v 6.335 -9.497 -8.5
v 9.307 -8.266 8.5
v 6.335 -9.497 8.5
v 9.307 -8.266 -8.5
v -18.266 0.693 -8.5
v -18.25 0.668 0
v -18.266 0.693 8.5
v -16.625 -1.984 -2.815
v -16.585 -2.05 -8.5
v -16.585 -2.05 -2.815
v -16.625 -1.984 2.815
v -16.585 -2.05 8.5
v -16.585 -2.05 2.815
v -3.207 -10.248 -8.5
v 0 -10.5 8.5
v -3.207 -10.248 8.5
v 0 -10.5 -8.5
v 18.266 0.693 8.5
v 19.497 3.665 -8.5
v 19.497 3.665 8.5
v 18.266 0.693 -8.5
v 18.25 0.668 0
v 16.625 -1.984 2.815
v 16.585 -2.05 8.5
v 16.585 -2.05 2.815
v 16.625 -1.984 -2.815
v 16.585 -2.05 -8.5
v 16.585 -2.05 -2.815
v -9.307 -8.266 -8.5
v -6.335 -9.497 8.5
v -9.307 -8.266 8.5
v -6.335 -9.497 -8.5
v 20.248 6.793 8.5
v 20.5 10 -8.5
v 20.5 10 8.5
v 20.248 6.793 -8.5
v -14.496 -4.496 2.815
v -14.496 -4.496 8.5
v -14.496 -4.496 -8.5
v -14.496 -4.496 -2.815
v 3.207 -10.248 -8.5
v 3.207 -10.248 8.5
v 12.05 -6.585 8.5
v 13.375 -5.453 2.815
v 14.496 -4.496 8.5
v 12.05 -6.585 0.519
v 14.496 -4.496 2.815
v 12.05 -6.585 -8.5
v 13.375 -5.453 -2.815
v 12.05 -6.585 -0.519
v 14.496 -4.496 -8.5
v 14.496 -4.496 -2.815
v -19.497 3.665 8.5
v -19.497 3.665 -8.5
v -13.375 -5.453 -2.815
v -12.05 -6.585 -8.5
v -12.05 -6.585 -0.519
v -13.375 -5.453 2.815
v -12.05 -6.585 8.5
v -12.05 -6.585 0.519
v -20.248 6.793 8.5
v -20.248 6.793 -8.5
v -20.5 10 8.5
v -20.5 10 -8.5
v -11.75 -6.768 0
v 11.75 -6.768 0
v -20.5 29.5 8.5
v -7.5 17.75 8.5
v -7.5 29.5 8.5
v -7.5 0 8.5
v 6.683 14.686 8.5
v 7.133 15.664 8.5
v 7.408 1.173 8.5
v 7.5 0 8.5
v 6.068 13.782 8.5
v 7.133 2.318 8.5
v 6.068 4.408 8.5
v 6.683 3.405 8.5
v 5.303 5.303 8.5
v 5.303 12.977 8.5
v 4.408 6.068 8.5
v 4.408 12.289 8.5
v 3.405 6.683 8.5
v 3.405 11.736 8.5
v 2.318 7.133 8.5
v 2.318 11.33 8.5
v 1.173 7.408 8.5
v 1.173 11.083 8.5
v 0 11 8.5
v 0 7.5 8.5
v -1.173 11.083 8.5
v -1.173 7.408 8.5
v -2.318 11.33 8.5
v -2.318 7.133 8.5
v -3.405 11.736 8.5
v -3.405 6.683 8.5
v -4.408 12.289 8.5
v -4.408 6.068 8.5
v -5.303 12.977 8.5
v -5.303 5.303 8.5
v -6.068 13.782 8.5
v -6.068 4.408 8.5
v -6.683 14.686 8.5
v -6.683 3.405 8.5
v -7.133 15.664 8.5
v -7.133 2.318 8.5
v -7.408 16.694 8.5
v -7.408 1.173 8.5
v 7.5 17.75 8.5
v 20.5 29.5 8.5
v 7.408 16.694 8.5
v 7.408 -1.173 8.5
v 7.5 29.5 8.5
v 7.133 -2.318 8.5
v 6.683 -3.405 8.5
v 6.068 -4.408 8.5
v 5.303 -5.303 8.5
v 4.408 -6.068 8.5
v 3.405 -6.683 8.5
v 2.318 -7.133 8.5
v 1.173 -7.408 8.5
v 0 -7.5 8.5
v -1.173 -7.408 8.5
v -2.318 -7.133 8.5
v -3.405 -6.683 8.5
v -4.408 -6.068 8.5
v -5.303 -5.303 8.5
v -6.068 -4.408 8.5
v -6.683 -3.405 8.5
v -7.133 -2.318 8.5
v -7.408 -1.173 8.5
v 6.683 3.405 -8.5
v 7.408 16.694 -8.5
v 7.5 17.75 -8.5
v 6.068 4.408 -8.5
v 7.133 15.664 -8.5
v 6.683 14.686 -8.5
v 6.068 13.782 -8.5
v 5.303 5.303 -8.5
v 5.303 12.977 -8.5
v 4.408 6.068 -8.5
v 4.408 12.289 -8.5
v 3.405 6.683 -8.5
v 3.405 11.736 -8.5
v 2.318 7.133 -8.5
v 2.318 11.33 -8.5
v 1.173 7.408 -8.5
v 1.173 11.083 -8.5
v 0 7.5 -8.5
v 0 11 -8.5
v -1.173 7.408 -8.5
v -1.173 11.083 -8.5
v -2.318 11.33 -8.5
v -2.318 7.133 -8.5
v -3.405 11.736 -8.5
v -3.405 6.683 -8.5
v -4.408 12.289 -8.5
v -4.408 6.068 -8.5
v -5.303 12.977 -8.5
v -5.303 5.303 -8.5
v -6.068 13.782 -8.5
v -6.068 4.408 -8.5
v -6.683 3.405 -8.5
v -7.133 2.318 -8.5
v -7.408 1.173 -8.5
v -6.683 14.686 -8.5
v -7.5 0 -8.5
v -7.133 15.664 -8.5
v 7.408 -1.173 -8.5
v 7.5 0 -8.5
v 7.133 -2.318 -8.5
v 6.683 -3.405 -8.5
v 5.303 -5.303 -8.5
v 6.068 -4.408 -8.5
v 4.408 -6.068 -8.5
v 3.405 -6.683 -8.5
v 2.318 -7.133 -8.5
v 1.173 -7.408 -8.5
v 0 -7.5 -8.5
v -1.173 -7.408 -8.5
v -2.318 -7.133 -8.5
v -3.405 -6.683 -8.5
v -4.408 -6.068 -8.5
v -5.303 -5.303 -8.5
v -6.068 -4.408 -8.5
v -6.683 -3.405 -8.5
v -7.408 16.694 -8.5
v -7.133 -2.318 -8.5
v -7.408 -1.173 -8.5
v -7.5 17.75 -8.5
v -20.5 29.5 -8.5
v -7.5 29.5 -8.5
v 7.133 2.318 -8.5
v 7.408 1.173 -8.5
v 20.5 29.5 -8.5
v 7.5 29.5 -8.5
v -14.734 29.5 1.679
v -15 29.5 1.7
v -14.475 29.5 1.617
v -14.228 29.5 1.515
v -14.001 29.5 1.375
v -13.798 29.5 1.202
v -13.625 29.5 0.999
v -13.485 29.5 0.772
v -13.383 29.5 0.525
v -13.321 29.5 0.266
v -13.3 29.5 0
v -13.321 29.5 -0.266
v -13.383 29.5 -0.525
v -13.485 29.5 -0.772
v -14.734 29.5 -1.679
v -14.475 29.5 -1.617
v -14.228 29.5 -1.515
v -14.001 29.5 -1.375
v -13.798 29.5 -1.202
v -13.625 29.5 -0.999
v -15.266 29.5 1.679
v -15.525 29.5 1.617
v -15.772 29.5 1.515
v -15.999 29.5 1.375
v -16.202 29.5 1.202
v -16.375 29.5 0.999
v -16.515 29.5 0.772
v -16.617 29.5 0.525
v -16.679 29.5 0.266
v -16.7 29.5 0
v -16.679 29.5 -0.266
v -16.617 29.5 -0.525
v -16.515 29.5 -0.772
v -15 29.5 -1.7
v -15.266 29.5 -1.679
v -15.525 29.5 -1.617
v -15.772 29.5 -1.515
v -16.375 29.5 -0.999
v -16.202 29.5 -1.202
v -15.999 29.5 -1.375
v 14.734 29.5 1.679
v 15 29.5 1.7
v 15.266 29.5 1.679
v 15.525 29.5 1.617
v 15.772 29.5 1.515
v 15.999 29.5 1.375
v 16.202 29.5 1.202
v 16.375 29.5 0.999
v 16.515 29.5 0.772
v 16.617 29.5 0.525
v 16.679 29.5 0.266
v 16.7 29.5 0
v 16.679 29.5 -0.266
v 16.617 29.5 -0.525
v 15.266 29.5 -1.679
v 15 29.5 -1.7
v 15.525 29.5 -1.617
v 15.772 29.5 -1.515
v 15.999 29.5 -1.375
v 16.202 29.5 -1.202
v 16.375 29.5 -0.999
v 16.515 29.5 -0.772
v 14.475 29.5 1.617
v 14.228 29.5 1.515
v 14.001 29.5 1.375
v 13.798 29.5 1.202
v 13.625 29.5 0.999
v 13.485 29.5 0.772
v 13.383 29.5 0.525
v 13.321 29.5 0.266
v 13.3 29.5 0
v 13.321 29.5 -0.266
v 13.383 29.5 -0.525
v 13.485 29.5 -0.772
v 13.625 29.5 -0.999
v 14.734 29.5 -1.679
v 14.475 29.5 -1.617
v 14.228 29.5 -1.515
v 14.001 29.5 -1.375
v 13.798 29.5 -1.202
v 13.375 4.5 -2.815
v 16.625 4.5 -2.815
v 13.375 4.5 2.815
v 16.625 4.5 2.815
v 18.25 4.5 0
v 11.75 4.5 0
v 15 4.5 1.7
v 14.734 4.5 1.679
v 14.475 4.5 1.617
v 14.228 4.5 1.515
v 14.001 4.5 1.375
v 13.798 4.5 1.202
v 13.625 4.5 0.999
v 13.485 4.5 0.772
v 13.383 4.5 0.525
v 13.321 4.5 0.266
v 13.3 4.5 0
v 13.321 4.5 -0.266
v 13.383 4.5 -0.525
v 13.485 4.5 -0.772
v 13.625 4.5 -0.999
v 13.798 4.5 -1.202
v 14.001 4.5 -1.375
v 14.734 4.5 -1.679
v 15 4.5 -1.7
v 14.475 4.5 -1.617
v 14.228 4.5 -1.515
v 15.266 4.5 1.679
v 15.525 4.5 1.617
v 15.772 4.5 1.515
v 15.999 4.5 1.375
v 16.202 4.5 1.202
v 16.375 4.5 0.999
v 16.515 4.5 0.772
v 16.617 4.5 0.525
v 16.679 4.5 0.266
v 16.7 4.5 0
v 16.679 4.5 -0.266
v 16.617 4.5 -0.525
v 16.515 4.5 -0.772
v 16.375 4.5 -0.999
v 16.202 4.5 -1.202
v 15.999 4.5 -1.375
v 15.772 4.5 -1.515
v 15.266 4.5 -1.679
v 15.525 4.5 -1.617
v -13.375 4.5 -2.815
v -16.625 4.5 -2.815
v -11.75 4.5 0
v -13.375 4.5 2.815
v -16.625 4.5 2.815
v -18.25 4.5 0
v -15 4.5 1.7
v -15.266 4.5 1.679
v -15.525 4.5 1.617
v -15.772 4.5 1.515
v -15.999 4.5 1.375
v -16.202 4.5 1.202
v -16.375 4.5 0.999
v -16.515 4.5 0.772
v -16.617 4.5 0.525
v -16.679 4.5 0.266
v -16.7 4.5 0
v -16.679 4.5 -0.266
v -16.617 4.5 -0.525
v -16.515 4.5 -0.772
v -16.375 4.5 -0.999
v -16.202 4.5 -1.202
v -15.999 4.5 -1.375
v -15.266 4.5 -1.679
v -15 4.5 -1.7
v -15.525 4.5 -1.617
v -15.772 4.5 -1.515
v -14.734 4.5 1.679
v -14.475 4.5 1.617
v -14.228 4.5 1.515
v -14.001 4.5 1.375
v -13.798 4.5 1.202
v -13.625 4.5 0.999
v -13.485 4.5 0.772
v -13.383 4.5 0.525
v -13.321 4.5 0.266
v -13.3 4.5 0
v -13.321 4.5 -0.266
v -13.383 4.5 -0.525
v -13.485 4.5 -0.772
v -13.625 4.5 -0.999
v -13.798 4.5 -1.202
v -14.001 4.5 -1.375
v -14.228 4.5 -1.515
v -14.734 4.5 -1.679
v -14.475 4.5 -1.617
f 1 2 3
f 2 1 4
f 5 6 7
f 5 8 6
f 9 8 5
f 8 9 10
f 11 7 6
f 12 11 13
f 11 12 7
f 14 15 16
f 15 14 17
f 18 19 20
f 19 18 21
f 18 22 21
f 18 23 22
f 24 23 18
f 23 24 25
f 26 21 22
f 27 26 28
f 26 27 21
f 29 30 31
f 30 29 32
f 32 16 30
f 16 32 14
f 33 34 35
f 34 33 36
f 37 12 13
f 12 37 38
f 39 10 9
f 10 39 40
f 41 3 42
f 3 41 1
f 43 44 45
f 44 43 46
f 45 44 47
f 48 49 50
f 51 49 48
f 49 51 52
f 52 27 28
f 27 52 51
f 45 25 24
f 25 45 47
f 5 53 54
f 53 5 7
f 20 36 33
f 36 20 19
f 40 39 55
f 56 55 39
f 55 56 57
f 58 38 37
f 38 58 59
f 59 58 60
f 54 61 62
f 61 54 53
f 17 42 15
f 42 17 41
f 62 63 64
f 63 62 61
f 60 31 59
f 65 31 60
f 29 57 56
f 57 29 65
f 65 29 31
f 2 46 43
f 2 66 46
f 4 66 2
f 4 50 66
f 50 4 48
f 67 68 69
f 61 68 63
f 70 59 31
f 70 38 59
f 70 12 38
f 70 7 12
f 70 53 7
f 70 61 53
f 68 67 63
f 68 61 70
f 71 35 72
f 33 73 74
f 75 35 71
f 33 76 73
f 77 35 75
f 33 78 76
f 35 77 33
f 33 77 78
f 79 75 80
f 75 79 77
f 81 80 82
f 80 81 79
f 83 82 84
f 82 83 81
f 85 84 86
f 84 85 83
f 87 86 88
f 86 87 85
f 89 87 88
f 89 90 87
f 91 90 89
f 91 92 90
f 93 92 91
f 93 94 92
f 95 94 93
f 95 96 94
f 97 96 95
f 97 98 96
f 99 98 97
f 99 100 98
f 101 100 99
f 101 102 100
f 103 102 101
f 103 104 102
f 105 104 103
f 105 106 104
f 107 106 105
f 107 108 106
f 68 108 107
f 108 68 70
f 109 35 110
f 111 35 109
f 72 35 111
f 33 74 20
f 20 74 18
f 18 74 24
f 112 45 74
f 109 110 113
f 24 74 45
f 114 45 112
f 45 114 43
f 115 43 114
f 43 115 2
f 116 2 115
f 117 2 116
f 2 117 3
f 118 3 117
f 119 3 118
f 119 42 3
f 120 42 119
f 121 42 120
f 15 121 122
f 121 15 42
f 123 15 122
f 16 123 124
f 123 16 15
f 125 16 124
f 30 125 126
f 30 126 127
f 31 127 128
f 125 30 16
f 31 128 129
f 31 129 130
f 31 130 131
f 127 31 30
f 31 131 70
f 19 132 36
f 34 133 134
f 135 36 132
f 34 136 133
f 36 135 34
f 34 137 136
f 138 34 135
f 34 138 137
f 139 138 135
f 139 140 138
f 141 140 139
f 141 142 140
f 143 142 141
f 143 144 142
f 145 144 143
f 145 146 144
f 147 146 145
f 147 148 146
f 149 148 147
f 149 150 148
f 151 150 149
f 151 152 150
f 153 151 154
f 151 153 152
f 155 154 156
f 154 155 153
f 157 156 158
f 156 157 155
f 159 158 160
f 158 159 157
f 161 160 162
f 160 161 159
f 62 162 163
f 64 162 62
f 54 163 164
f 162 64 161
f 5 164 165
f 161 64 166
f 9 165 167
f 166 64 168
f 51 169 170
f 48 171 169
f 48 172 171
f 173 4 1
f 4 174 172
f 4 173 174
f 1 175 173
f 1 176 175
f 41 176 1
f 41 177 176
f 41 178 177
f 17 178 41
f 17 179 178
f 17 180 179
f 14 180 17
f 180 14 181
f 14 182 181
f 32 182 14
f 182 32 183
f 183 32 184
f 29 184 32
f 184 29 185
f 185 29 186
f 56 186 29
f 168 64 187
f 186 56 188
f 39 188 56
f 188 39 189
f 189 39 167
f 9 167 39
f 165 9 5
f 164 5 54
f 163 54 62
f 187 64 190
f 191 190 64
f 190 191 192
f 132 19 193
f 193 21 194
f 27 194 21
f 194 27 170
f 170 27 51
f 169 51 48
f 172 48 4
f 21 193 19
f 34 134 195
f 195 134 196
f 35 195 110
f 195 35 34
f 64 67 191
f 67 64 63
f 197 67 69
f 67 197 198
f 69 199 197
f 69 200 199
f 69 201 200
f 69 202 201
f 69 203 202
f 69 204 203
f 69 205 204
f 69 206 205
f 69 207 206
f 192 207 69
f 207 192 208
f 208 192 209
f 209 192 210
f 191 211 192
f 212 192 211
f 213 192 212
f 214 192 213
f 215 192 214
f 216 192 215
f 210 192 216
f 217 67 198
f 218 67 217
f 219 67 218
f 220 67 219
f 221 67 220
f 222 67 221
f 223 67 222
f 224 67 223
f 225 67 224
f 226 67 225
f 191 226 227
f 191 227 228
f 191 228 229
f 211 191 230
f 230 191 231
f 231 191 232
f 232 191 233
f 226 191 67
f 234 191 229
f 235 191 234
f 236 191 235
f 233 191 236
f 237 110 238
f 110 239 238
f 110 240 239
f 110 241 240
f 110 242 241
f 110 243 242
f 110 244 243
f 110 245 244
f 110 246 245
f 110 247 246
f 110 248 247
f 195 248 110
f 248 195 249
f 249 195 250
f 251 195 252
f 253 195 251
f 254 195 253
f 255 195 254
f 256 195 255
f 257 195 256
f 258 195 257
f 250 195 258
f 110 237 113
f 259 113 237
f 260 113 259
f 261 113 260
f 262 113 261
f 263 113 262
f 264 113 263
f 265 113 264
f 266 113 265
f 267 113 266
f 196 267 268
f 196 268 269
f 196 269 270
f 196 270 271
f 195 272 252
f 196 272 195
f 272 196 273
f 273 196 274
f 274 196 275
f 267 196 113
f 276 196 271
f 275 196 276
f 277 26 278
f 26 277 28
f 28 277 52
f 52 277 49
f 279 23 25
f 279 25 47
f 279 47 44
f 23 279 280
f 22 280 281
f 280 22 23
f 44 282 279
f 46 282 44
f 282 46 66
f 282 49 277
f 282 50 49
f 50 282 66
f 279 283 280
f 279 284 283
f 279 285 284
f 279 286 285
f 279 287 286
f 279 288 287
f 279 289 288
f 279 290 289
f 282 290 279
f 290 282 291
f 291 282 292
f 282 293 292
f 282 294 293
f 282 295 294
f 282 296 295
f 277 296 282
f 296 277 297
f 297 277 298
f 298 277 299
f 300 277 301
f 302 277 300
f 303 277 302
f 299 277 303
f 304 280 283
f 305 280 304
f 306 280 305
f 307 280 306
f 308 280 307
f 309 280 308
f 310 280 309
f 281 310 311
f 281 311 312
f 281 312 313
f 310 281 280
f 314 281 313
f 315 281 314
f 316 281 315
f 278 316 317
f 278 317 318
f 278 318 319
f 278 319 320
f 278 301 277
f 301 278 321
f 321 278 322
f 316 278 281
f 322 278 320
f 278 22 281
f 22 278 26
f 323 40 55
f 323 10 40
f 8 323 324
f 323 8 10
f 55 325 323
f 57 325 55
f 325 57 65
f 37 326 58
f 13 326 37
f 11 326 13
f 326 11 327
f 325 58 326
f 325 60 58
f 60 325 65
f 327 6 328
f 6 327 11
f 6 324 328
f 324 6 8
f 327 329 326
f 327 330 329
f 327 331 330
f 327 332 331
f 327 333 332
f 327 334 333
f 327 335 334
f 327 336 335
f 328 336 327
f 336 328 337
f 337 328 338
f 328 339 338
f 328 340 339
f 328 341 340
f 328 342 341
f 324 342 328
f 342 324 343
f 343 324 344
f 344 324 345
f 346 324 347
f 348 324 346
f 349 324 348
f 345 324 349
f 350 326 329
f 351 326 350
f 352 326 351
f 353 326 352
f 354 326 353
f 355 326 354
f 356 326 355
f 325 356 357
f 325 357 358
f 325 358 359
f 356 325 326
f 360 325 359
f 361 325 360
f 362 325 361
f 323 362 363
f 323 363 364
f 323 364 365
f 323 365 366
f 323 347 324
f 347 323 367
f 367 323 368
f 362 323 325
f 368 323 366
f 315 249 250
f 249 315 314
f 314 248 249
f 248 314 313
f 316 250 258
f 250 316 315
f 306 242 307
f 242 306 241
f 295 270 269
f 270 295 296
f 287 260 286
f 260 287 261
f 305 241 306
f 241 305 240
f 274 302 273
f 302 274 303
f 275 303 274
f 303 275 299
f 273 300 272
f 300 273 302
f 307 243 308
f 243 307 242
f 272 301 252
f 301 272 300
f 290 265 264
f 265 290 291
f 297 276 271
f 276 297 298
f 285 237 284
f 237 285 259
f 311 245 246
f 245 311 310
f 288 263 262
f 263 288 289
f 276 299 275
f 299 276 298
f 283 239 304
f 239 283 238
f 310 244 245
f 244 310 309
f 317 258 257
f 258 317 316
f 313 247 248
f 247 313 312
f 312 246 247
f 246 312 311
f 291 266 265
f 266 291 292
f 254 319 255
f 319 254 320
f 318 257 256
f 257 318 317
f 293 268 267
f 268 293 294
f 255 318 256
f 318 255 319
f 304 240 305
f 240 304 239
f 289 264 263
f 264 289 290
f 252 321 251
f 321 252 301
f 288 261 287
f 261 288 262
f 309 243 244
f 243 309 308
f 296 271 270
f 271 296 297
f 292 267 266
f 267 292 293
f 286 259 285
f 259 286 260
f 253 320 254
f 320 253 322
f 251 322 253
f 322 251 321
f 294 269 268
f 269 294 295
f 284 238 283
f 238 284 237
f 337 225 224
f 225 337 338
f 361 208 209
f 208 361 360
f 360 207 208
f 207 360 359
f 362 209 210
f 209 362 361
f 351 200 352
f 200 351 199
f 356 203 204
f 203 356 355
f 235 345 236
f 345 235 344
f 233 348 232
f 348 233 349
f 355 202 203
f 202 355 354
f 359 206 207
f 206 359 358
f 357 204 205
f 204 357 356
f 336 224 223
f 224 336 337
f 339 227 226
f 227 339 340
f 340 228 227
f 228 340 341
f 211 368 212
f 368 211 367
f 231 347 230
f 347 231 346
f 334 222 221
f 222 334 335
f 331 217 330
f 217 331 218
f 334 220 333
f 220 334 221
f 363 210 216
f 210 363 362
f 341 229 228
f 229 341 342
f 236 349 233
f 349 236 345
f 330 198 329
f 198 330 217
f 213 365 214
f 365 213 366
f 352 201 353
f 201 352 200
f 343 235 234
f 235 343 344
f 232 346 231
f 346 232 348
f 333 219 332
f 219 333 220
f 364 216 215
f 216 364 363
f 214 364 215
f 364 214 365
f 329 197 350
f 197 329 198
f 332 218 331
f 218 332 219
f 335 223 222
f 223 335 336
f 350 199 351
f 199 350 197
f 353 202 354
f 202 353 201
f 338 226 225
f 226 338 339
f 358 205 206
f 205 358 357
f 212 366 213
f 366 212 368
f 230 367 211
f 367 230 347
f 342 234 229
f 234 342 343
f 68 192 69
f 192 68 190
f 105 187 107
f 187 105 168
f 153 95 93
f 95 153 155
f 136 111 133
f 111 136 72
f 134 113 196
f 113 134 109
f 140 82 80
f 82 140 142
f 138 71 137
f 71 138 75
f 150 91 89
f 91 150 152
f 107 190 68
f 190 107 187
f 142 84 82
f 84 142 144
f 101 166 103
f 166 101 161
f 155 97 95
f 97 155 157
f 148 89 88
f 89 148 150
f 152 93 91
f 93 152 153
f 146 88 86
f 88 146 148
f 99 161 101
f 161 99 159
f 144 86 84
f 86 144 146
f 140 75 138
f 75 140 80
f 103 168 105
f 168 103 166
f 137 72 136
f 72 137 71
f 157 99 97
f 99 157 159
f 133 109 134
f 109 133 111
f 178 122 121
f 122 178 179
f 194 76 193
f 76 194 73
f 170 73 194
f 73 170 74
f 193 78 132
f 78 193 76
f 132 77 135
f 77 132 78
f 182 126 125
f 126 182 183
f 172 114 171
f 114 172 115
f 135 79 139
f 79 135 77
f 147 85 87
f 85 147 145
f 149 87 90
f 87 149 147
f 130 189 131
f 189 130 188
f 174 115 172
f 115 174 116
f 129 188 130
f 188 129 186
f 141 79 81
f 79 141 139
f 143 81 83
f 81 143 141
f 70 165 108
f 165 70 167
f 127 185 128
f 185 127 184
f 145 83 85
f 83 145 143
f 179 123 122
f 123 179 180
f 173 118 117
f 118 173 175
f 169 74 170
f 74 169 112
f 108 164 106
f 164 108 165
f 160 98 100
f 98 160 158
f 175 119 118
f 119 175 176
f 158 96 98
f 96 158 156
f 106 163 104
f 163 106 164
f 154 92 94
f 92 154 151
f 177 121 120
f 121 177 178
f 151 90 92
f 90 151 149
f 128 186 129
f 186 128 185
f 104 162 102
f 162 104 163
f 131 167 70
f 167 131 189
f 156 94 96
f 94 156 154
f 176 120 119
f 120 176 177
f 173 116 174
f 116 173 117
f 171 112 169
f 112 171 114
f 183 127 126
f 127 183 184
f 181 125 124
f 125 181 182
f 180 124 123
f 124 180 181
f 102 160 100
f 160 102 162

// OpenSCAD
//Set height : distance between the plate and the center of the 8mm rod
height=29.5;//[10:0.5:50]

//Set width 
width=17;//[10:0.5:45]

//Screw spacing
Screw_spacing=30;//[20:0.5:35]

//What kind of bearing? or bearing mount?
bearing_option=1;//[0:printed bearing,1:15mm bearing no gap,2:15mm bearing with gap,3:15mm bearing hold with filament]
//Offset bearing position
bearing_shift_position=0;//[0:0.1:1]

//printer accuracy, positive value will add some space for bearings plug
tolerance=0;//[-0.3:0.05:1]
//definition
$fn=40;//[40:low,60:medium,100:high]

//////////////////////////////////////////////
module dent(angle) {
rotate([0,0,angle]) translate([tolerance,0,0]) hull() {
translate([4.3,-0.4,0]) cylinder(d=0.5,h=width+4,center=true);
translate([4.325,0.1,0]) cylinder(d=0.5,h=width+4,center=true);
translate([6.5,0.2,0]) cylinder(d=0.5,h=width+4,center=true);
translate([6.2,2.55,0]) cylinder(d=0.5,h=width+4,center=true);
}
}
module bearing(a) {
    if(a==0) {
        difference() {
            cylinder(d=13,h=width+2,center=true);
            for (i=[0:360/9:360-360/9]) dent(i);
        }
    }
    
    else if(a==1) {
        cylinder(d=15+2*tolerance,h=width+2,center=true);
    }
    
    else if(a==2) {
        difference() {
            cylinder(d=15+2*tolerance+2,h=width+2,center=true);
            for (i=[45:90:315]) rotate([0,0,i]) translate([7.5+tolerance+1.75/2,0,0]) cylinder(d=1.75,h=width+2+2,center=true);
            }
    }
    
    else if(a==3) {
        cylinder(d=15+2*tolerance+1,h=width+2,center=true);
        for (i=[45:90:315]) rotate([0,0,i]) translate([7.5+tolerance+1.25/2,0,0]) cylinder(d=1.75,h=width+2+2,center=true);
    }
}

module Common_part() {
    difference() {
        union() {
            difference() {
                translate([0,10,0]) cylinder(d=41,h=width,center=true);
                translate([0,43/2+10,0]) cube([43,43,width+2],center=true);
            }
            translate([0,5+height/2,0]) cube([41,height-10,width],center=true);
        }
        hull() {
            for (i=[17.75,17.75+height]) translate([0,i,0]) scale([1,0.9,1]) cylinder(d=15,h=width+2,center=true);}
    
        for(i=[Screw_spacing/2,-Screw_spacing/2]) translate([i,-2.5,0]) rotate([90,0,0]) rotate([0,0,0]) cylinder(d=6.5,h=14,$fn=6,center=true);
        for(i=[Screw_spacing/2,-Screw_spacing/2]) translate([i,-2.5,0]) rotate([-90,0,0]) cylinder(d=3.4,h=height+5);
    
    }    
    
}



difference() {
    Common_part();
    translate([bearing_shift_position,0,0]) bearing(bearing_option);
}


